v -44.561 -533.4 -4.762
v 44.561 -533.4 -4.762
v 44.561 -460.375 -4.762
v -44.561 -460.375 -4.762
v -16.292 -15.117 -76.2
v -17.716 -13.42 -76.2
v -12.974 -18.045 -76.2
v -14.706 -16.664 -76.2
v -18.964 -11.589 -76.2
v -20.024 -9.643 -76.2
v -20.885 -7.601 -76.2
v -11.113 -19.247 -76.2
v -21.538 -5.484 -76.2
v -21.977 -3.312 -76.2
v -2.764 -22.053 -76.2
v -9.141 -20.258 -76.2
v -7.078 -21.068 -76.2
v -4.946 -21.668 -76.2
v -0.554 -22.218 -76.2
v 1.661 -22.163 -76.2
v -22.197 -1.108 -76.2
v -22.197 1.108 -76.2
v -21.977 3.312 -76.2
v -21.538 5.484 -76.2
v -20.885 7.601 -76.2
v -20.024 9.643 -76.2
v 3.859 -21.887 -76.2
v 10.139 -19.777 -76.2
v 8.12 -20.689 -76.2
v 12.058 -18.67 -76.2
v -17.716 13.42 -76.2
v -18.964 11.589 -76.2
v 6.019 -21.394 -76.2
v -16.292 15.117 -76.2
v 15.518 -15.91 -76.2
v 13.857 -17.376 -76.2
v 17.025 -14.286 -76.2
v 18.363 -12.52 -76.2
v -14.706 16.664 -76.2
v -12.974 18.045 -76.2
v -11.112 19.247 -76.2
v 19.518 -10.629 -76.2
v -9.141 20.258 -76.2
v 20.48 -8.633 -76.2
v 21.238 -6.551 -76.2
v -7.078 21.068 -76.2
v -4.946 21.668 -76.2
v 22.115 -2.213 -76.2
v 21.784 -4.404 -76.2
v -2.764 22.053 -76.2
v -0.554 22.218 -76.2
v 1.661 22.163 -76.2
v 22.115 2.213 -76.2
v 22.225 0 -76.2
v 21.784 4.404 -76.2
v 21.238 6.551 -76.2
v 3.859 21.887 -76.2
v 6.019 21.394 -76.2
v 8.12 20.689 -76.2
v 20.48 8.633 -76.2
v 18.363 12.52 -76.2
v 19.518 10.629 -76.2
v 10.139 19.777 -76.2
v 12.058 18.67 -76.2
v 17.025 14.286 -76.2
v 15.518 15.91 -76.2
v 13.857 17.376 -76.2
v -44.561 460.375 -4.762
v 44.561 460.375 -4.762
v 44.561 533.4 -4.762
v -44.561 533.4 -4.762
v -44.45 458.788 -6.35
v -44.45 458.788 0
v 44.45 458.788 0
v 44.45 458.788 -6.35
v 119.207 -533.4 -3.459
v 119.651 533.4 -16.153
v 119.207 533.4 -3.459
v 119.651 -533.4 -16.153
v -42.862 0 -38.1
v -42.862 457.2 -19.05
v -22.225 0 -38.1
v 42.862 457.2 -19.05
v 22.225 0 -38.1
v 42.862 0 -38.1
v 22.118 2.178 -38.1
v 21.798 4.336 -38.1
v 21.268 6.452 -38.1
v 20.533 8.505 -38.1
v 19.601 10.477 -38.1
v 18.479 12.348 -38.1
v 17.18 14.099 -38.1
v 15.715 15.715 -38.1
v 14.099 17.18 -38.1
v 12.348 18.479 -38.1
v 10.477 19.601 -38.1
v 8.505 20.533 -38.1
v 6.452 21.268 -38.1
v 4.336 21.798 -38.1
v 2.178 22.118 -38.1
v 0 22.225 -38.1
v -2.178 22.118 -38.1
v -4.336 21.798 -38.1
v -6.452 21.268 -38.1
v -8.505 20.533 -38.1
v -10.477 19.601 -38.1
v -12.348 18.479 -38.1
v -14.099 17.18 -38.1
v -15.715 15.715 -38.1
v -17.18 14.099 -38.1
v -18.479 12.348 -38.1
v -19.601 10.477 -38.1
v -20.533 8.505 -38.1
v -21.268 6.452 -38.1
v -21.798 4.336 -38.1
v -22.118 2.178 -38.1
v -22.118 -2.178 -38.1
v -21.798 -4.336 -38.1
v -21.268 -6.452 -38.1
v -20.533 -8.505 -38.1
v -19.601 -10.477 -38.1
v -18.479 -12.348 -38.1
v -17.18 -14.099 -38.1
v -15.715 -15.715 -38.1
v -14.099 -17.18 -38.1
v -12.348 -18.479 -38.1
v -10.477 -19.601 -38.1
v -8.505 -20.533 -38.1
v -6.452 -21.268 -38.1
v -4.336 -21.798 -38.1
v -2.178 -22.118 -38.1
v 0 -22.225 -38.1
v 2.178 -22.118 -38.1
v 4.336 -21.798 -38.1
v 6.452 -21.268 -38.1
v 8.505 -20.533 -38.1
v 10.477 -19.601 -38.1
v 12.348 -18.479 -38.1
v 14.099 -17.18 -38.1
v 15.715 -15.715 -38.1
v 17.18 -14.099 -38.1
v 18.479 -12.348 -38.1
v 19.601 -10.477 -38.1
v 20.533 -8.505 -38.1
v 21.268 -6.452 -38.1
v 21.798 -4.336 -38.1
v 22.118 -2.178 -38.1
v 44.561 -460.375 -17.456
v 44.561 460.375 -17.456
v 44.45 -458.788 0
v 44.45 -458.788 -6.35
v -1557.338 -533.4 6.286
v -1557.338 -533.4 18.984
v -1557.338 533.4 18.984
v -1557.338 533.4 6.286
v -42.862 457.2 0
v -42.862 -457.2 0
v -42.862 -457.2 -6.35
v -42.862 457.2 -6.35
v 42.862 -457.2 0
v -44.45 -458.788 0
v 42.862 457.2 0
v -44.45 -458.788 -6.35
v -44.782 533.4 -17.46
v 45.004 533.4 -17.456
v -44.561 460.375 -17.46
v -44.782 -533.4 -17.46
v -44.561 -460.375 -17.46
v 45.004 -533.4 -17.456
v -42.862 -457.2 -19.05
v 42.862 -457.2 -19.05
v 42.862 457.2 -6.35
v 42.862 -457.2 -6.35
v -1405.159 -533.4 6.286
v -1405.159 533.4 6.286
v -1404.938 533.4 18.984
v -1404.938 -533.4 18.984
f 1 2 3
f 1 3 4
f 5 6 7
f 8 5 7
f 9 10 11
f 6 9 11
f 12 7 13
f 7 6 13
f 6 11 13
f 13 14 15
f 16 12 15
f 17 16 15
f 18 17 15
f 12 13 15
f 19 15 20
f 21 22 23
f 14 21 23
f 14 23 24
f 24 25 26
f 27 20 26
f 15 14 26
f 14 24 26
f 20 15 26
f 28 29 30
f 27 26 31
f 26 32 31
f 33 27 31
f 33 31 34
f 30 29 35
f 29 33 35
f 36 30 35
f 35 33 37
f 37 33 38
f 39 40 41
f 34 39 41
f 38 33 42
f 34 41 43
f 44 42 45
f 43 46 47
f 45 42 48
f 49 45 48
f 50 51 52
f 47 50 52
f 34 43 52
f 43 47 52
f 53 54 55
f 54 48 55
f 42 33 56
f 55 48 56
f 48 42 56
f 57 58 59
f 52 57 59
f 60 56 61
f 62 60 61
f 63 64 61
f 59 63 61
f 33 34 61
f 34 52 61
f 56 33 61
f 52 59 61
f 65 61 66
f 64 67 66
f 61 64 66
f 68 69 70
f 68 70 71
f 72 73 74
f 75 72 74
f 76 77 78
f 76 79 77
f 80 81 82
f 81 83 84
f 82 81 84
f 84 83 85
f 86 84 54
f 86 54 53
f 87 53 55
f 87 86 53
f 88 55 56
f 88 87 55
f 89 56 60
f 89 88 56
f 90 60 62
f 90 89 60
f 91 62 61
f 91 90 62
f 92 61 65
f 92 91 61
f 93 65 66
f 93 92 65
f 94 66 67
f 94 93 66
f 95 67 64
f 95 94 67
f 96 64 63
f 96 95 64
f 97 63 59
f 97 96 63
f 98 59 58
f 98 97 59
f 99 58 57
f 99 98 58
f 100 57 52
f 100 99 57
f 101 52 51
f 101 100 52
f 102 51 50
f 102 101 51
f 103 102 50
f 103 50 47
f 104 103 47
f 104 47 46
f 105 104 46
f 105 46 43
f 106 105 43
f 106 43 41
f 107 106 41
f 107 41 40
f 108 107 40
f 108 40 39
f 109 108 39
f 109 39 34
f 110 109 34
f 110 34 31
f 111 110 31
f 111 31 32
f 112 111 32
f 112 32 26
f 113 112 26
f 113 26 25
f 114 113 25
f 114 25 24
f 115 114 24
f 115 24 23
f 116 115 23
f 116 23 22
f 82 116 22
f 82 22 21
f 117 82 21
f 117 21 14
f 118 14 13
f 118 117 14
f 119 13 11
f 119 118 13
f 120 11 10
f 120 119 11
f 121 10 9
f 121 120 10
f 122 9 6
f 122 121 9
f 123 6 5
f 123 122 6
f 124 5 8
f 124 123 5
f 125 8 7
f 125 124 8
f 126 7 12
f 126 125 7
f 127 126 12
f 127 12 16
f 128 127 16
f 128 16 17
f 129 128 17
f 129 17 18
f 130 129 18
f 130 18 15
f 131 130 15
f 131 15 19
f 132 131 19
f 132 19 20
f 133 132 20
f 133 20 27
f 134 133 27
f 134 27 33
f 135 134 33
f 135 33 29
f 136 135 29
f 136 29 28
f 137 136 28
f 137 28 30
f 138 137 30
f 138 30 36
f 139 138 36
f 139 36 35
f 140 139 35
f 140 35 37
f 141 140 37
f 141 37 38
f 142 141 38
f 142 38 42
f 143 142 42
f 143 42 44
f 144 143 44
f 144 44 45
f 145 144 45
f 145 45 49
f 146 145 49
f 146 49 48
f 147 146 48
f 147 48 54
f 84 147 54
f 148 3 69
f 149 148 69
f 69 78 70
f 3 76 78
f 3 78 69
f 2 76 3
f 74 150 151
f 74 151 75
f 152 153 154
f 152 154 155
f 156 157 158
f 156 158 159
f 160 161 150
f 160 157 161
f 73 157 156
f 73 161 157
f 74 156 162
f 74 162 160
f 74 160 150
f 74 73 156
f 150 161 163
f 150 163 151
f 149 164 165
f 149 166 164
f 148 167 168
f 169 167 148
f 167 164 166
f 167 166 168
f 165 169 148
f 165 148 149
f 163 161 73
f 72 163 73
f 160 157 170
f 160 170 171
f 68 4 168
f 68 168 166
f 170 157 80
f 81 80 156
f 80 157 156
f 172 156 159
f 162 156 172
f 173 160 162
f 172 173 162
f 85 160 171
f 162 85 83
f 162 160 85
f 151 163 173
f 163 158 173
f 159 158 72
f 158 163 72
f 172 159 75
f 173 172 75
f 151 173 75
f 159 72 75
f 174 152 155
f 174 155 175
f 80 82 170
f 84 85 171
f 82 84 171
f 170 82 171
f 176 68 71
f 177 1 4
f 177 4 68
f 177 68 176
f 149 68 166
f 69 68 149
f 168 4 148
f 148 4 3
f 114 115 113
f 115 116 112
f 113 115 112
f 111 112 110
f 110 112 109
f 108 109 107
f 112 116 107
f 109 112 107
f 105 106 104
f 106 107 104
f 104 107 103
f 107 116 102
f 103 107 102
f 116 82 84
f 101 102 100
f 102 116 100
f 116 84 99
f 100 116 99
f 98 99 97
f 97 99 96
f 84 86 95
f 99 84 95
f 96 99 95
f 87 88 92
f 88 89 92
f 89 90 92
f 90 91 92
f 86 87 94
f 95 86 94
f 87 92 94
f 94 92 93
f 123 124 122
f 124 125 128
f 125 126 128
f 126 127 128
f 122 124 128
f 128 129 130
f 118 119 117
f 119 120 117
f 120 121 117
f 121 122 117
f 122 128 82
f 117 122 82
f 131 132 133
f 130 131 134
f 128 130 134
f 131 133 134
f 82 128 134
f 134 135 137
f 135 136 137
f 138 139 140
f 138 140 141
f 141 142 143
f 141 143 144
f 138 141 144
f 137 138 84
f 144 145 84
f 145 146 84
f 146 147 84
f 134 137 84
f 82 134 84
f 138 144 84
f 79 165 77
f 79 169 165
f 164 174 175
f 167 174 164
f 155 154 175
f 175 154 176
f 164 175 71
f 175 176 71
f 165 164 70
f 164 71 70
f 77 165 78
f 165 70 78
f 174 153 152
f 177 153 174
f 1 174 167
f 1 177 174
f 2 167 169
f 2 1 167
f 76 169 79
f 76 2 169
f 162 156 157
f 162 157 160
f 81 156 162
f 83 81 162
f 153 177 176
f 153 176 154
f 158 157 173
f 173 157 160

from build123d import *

# Parameters (mm, degrees)
F0_W           = 85.725
F0_H           = 914.4
F0_R           = 25.4
F0_R_2         = 22.225
F1_DEPTH       = 38.1
F2_DEPTH       = 76.2
F4_DEPTH       = 85.726
F5_W           = 88.9
F5_H           = 917.575
F5_W_2         = 85.725
F5_H_2         = 914.4
F6_DEPTH       = 6.35
F10_DEPTH      = 533.4
F10_DEPTH_BACK = 533.4
F11_W          = 89.1216455618
F11_H          = 920.75
F12_DEPTH      = 71.4394671358


# Not quite as in the source:
# - a length typed as a fraction of an inch, garbled in the dataset ("3 / 203.2 mm" for 3/8 in), is restored
# - a pattern or mirror of a feature is missing from the dataset's text; its kind, count and spacing are read off the source's solid


with BuildPart() as f1:
    # F0 (on Top) → F1 (new body)
    with BuildSketch(Plane.XY):
        Rectangle(F0_W, F0_H)
        Circle(F0_R, mode=Mode.SUBTRACT)
        Circle(F0_R)
        Circle(F0_R_2, mode=Mode.SUBTRACT)
        Circle(F0_R_2)
    extrude(amount=-F1_DEPTH)



with BuildPart() as f2:
    # F0 (on Top) → F2 (new body)
    with BuildSketch(Plane.XY):
        Circle(F0_R_2)
    extrude(amount=-F2_DEPTH)


with BuildPart() as f1_1:
    add(f1.part)

    add(f2.part)  # F2_copies merges F2
    # F2_copies: F2 across plane
    add(f2.part.mirror(Plane(origin=(0, 0, -38.1), x_dir=(-1, 0, 0), z_dir=(0, 0, -1))))

    # F3 (on face) → F4 (cut, through all)
    with BuildSketch(Plane.YZ.offset(42.8625)):
        Polygon((-457.2, -38.1), (0, -38.1), (-457.2, -19.05), align=None)
        Polygon((457.2, -19.05), (0, -38.1), (457.2, -38.1), align=None)
    extrude(amount=-F4_DEPTH, mode=Mode.SUBTRACT)


with BuildPart() as f6:
    # F5 (on face) → F6 (new body)
    with BuildSketch(Plane.XY):
        Rectangle(F5_W, F5_H)
        Rectangle(F5_W_2, F5_H_2, mode=Mode.SUBTRACT)
    extrude(amount=-F6_DEPTH)


with BuildPart() as f10:
    # F9 (on Front) → F10 (new body, two sides)
    with BuildSketch(Plane.XZ) as f10_sk:
        Polygon((119.207431633, -3.4585714601), (44.5608227809, -4.7615328642), (45.0041139044, -17.4557297551), (119.6507227565, -16.1527683509), align=None)
        Polygon((-44.7824683426, -17.4595985927), (-44.5608227809, -4.7615328642), (-1404.9375, 18.9839303634), (-1404.9375, 6.285864635), (-1405.1591455618, 6.285864635), align=None)
        Polygon((-1404.9375, 6.285864635), (-1404.9375, 18.9839303634), (-1557.3375, 18.9839303634), (-1557.3375, 6.285864635), (-1405.1591455618, 6.285864635), align=None)
        Polygon((44.5608227809, -4.7615328642), (-44.5608227809, -4.7615328642), (-44.7824683426, -17.4595985927), (45.0041139044, -17.4557297551), align=None)
    extrude(amount=F10_DEPTH)
    extrude(f10_sk.sketch, amount=-F10_DEPTH_BACK)

    # F11 (on face) → F12 (cut, through all)
    with BuildSketch(Plane.XY.offset(-4.7615328642)):
        Rectangle(F11_W, F11_H)
    extrude(amount=-F12_DEPTH, mode=Mode.SUBTRACT)


solid = Compound([f1_1.part, f6.part, f10.part])
